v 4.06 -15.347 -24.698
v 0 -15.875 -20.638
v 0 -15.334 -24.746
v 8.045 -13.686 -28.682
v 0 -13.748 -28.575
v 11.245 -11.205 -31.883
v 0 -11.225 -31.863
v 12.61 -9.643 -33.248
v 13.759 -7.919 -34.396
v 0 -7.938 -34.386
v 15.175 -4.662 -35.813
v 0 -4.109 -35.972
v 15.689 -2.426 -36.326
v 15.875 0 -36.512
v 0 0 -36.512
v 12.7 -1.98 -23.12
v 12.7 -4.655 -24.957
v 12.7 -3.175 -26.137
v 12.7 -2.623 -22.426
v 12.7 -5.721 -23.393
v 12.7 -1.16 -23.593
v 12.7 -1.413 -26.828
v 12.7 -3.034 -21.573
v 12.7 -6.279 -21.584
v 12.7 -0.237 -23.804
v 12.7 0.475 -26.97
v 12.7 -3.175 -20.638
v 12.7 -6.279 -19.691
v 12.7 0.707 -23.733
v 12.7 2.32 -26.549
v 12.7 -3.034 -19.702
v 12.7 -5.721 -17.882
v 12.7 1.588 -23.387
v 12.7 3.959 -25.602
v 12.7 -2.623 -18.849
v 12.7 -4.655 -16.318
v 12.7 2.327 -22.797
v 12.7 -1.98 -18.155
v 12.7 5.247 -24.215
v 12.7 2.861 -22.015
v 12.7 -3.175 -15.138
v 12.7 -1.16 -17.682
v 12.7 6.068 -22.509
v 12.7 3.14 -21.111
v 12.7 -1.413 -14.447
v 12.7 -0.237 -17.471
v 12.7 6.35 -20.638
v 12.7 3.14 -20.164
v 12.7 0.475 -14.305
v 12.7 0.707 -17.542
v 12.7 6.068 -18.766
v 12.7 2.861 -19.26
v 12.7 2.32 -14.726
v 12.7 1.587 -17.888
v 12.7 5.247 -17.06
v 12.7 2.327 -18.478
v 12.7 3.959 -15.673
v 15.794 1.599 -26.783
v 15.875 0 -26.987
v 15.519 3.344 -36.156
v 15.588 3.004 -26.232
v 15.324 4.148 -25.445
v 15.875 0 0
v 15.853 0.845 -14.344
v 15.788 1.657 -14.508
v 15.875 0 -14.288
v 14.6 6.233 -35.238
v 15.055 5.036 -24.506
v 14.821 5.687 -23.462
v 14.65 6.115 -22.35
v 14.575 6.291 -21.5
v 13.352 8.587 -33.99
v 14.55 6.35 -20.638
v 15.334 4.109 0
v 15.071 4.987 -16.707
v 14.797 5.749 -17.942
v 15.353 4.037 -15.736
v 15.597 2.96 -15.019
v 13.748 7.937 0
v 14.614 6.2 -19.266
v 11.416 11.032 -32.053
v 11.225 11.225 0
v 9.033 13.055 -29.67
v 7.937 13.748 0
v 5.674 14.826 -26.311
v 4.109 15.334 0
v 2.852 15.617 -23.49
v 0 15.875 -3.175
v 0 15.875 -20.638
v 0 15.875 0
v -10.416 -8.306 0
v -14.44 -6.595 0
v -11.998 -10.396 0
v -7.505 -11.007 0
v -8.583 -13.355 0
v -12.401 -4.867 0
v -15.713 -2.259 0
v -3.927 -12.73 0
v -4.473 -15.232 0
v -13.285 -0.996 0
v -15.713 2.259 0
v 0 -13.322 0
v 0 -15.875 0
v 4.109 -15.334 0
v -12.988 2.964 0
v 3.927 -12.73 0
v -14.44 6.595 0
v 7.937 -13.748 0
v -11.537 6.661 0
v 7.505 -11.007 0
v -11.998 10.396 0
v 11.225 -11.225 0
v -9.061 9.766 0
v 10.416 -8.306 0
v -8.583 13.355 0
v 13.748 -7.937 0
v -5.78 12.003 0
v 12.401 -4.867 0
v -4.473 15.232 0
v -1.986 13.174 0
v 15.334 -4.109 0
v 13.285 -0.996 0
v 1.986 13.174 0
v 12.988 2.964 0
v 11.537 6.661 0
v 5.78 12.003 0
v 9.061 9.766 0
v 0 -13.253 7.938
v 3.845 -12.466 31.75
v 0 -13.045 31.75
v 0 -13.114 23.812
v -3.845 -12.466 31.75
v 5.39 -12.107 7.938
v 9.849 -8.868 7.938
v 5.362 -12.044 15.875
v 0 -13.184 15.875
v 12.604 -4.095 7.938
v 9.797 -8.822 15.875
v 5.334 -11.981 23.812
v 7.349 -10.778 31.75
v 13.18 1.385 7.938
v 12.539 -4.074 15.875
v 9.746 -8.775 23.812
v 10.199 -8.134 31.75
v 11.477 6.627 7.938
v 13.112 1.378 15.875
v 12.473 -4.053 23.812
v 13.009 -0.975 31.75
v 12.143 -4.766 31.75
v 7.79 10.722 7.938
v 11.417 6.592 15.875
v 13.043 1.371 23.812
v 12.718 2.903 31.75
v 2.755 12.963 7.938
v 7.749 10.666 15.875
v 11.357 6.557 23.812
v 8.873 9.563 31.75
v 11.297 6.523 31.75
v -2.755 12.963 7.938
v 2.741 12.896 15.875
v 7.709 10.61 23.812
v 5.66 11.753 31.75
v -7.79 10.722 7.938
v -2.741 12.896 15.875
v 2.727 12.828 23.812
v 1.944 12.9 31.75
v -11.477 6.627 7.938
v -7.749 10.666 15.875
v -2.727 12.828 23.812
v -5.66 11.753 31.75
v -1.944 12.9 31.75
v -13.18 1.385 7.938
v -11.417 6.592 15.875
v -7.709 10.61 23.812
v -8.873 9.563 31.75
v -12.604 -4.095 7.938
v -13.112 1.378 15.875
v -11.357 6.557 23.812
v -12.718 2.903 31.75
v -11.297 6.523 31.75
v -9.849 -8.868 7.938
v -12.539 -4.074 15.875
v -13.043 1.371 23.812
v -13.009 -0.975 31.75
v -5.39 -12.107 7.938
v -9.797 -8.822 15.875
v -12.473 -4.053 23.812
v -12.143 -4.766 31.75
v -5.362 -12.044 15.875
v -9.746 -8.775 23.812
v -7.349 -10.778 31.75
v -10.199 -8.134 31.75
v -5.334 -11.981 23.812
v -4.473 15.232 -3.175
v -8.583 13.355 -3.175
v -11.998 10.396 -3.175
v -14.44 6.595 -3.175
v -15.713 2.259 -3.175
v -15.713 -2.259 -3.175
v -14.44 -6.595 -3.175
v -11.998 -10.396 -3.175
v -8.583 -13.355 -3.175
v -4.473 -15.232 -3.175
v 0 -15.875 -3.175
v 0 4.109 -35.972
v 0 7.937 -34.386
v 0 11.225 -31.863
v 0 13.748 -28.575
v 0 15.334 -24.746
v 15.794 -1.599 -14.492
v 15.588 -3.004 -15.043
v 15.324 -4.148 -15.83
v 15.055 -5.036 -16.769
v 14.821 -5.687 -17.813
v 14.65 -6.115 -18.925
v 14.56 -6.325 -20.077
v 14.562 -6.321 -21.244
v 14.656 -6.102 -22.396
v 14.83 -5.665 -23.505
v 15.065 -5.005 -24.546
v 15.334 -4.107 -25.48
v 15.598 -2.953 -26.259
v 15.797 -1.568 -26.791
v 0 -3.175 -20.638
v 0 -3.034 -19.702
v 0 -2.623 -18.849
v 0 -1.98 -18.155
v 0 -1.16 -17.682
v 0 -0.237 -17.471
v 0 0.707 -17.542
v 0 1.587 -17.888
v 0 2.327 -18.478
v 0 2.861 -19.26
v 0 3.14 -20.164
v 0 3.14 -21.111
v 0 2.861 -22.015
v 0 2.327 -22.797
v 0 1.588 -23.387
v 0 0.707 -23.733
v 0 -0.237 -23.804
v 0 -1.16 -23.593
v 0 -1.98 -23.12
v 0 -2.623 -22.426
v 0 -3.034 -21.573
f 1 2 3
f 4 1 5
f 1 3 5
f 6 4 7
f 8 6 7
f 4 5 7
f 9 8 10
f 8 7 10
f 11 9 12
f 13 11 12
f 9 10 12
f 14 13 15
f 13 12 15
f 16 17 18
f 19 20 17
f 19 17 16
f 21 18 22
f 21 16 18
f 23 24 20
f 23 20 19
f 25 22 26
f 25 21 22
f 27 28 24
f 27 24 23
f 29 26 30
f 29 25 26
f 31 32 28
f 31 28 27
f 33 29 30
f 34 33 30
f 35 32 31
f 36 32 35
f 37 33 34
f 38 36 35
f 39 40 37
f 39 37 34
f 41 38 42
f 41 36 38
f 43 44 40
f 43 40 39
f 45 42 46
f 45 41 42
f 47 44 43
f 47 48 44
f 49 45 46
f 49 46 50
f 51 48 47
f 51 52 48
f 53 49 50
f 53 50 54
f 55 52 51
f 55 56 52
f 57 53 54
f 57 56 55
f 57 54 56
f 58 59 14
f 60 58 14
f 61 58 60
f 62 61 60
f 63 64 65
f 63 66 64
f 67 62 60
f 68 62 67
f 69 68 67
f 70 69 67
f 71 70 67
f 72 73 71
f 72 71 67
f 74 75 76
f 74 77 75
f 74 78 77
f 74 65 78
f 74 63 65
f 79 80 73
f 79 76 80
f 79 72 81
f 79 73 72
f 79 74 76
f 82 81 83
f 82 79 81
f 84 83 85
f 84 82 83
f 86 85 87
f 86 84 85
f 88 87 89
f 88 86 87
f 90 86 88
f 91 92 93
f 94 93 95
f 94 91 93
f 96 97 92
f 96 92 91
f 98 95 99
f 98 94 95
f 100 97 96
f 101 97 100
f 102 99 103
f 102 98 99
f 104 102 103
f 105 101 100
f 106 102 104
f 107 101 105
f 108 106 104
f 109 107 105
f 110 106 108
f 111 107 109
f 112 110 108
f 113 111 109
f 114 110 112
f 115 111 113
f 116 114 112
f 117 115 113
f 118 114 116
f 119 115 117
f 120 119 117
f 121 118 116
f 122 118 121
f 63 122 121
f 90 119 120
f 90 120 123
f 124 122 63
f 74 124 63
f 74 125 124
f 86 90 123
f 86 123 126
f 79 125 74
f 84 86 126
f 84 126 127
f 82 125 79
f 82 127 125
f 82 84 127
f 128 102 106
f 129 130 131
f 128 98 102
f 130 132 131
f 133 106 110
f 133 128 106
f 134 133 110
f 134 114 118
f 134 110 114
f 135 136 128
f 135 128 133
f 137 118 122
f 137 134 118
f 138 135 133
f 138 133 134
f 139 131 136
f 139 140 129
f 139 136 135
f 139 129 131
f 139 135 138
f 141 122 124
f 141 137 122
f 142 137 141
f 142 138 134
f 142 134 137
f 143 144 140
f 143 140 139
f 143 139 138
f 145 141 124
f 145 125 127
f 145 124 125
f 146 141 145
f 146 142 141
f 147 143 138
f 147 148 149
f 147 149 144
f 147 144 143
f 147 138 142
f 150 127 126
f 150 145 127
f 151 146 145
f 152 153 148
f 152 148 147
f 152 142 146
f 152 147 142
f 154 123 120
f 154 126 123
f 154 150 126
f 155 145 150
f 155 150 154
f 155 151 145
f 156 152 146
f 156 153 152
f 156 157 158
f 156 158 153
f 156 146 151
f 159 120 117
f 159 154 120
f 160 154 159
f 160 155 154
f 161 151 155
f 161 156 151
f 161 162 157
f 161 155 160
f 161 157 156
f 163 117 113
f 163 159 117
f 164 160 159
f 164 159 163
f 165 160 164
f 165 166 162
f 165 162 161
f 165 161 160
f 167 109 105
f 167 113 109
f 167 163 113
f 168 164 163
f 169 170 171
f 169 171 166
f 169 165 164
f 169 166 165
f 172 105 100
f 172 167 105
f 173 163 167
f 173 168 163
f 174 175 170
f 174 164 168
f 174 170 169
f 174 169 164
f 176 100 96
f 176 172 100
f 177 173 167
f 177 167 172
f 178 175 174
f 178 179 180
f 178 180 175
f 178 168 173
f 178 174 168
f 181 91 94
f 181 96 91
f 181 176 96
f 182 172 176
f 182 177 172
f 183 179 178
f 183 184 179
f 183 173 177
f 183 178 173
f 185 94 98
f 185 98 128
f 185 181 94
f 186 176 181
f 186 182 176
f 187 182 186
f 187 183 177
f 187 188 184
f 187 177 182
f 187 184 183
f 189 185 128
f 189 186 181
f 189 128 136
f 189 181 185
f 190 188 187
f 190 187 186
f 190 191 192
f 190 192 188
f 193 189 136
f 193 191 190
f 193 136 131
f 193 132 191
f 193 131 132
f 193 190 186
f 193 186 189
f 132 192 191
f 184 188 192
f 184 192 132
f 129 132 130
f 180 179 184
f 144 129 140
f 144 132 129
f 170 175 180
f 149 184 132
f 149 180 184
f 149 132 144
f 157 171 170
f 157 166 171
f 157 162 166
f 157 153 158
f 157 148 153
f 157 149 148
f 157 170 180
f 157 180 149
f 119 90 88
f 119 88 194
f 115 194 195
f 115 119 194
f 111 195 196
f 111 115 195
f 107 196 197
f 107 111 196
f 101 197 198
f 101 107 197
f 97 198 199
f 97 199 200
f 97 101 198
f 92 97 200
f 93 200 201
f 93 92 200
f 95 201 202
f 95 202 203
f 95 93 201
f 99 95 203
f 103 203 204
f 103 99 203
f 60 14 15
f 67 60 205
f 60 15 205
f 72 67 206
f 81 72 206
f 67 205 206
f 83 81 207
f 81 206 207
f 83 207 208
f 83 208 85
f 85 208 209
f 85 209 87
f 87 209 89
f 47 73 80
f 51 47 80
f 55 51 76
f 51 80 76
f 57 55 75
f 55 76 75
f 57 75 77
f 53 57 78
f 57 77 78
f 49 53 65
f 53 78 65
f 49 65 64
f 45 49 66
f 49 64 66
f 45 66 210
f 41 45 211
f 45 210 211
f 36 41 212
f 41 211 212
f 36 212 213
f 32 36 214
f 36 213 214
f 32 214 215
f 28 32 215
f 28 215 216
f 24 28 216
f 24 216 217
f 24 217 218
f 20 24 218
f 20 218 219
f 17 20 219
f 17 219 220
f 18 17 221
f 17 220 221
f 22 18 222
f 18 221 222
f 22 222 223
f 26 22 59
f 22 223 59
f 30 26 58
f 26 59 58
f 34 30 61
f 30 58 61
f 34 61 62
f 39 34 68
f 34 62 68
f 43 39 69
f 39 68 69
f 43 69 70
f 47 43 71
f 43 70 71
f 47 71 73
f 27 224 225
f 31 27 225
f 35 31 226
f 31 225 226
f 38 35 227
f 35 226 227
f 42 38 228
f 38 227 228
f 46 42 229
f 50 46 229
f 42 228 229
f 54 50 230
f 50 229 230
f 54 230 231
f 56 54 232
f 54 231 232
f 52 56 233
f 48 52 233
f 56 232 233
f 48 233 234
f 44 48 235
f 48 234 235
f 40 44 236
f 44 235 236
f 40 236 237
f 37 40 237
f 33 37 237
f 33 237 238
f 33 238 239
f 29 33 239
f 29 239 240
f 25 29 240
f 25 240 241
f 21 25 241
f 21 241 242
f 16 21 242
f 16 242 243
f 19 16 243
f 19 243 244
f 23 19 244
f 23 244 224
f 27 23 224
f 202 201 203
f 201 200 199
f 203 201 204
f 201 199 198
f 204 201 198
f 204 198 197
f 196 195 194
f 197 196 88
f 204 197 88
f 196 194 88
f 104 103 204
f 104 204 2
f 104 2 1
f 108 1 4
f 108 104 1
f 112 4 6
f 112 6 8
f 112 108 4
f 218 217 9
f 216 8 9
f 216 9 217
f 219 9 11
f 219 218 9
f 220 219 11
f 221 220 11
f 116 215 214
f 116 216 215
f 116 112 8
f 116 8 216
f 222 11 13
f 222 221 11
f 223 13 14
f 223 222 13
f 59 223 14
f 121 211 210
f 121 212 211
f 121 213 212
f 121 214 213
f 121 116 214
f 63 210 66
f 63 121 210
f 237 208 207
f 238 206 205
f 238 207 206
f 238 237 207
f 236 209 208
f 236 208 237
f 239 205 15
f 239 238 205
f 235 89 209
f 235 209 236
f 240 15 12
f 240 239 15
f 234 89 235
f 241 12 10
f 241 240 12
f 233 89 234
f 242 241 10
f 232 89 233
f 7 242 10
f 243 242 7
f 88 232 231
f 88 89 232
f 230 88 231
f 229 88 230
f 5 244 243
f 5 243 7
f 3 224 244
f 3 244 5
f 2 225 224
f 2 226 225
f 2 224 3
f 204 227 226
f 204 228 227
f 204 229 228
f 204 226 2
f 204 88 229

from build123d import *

# Parameters (mm, degrees)
F1_DEPTH = 31.75
F1_TAPER = 0.5
F2_DEPTH = 36.5125
F3_DEPTH = 3.175
F5_DEPTH = 15.876
F7_R     = 6.35
F8_DEPTH = 3.175


with BuildPart() as f1:
    # F0 (on Top) → F1 (new body)
    with BuildSketch(Plane.XY):
        with BuildLine():
            Line((0, -13.3223), (0, 13.3223))
            ThreePointArc((0, 13.3223), (-13.3223, 0), (0, -13.3223))
        make_face()
        with BuildLine():
            ThreePointArc((0, -13.3223), (9.420288671, -9.420288671), (13.3223, 0))
            ThreePointArc((13.3223, 0), (9.420288671, 9.420288671), (0, 13.3223))
            Line((0, 13.3223), (0, -13.3223))
        make_face()
    extrude(amount=F1_DEPTH, taper=F1_TAPER)

    # F0 (on Top) → F2 (join)
    with BuildSketch(Plane.XY):
        with BuildLine():
            ThreePointArc((0, -13.3223), (9.420288671, -9.420288671), (13.3223, 0))
            ThreePointArc((13.3223, 0), (9.420288671, 9.420288671), (0, 13.3223))
            Line((0, 13.3223), (0, -13.3223))
        make_face()
        with BuildLine():
            ThreePointArc((0, 13.3223), (9.420288671, 9.420288671), (13.3223, 0))
            ThreePointArc((13.3223, 0), (9.420288671, -9.420288671), (0, -13.3223))
            Line((0, -13.3223), (0, -15.875))
            ThreePointArc((0, -15.875), (11.2253201513, -11.2253201513), (15.875, 0))
            ThreePointArc((15.875, 0), (11.2253201513, 11.2253201513), (0, 15.875))
            Line((0, 15.875), (0, 13.3223))
        make_face()
    extrude(amount=-F2_DEPTH)

    # F0 (on Top) → F3 (join)
    with BuildSketch(Plane.XY):
        with BuildLine():
            ThreePointArc((0, -13.3223), (-13.3223, 0), (0, 13.3223))
            Line((0, 13.3223), (0, 15.875))
            ThreePointArc((0, 15.875), (-15.875, 0), (0, -15.875))
            Line((0, -15.875), (0, -13.3223))
        make_face()
        with BuildLine():
            Line((0, -13.3223), (0, 13.3223))
            ThreePointArc((0, 13.3223), (-13.3223, 0), (0, -13.3223))
        make_face()
    extrude(amount=-F3_DEPTH)

    # F4 (on face) → F5 (cut, through all)
    with BuildSketch(Plane(origin=(0, 0, 0), x_dir=(0, -1, 0), z_dir=(-1, 0, 0))):
        with BuildLine():
            ThreePointArc((-3.175, -20.6375), (0, -23.8125), (3.175, -20.6375))
            Line((3.175, -20.6375), (-3.175, -20.6375))
        make_face()
        with BuildLine():
            Line((-3.175, -20.6375), (3.175, -20.6375))
            ThreePointArc((3.175, -20.6375), (0, -17.4625), (-3.175, -20.6375))
        make_face()
        with BuildLine():
            ThreePointArc((5.44e-08, -36.5125), (-11.2253201321, -31.8628201706), (-15.875, -20.6375))
            Line((-15.875, -20.6375), (-15.875, -36.5125))
            Line((-15.875, -36.5125), (5.44e-08, -36.5125))
        make_face()
        with BuildLine():
            Line((15.875, -36.5125), (15.875, -20.6375))
            ThreePointArc((15.875, -20.6375), (11.2253201706, -31.8628201321), (5.44e-08, -36.5125))
            Line((5.44e-08, -36.5125), (15.875, -36.5125))
        make_face()
    extrude(amount=-F5_DEPTH, mode=Mode.SUBTRACT)

    # F7 (on offset) → F8 (cut)
    with BuildSketch(Plane.YZ.offset(15.875)):
        with Locations((0, -20.6375)):
            Circle(F7_R)
    extrude(amount=-F8_DEPTH, mode=Mode.SUBTRACT)


solid = f1.part
